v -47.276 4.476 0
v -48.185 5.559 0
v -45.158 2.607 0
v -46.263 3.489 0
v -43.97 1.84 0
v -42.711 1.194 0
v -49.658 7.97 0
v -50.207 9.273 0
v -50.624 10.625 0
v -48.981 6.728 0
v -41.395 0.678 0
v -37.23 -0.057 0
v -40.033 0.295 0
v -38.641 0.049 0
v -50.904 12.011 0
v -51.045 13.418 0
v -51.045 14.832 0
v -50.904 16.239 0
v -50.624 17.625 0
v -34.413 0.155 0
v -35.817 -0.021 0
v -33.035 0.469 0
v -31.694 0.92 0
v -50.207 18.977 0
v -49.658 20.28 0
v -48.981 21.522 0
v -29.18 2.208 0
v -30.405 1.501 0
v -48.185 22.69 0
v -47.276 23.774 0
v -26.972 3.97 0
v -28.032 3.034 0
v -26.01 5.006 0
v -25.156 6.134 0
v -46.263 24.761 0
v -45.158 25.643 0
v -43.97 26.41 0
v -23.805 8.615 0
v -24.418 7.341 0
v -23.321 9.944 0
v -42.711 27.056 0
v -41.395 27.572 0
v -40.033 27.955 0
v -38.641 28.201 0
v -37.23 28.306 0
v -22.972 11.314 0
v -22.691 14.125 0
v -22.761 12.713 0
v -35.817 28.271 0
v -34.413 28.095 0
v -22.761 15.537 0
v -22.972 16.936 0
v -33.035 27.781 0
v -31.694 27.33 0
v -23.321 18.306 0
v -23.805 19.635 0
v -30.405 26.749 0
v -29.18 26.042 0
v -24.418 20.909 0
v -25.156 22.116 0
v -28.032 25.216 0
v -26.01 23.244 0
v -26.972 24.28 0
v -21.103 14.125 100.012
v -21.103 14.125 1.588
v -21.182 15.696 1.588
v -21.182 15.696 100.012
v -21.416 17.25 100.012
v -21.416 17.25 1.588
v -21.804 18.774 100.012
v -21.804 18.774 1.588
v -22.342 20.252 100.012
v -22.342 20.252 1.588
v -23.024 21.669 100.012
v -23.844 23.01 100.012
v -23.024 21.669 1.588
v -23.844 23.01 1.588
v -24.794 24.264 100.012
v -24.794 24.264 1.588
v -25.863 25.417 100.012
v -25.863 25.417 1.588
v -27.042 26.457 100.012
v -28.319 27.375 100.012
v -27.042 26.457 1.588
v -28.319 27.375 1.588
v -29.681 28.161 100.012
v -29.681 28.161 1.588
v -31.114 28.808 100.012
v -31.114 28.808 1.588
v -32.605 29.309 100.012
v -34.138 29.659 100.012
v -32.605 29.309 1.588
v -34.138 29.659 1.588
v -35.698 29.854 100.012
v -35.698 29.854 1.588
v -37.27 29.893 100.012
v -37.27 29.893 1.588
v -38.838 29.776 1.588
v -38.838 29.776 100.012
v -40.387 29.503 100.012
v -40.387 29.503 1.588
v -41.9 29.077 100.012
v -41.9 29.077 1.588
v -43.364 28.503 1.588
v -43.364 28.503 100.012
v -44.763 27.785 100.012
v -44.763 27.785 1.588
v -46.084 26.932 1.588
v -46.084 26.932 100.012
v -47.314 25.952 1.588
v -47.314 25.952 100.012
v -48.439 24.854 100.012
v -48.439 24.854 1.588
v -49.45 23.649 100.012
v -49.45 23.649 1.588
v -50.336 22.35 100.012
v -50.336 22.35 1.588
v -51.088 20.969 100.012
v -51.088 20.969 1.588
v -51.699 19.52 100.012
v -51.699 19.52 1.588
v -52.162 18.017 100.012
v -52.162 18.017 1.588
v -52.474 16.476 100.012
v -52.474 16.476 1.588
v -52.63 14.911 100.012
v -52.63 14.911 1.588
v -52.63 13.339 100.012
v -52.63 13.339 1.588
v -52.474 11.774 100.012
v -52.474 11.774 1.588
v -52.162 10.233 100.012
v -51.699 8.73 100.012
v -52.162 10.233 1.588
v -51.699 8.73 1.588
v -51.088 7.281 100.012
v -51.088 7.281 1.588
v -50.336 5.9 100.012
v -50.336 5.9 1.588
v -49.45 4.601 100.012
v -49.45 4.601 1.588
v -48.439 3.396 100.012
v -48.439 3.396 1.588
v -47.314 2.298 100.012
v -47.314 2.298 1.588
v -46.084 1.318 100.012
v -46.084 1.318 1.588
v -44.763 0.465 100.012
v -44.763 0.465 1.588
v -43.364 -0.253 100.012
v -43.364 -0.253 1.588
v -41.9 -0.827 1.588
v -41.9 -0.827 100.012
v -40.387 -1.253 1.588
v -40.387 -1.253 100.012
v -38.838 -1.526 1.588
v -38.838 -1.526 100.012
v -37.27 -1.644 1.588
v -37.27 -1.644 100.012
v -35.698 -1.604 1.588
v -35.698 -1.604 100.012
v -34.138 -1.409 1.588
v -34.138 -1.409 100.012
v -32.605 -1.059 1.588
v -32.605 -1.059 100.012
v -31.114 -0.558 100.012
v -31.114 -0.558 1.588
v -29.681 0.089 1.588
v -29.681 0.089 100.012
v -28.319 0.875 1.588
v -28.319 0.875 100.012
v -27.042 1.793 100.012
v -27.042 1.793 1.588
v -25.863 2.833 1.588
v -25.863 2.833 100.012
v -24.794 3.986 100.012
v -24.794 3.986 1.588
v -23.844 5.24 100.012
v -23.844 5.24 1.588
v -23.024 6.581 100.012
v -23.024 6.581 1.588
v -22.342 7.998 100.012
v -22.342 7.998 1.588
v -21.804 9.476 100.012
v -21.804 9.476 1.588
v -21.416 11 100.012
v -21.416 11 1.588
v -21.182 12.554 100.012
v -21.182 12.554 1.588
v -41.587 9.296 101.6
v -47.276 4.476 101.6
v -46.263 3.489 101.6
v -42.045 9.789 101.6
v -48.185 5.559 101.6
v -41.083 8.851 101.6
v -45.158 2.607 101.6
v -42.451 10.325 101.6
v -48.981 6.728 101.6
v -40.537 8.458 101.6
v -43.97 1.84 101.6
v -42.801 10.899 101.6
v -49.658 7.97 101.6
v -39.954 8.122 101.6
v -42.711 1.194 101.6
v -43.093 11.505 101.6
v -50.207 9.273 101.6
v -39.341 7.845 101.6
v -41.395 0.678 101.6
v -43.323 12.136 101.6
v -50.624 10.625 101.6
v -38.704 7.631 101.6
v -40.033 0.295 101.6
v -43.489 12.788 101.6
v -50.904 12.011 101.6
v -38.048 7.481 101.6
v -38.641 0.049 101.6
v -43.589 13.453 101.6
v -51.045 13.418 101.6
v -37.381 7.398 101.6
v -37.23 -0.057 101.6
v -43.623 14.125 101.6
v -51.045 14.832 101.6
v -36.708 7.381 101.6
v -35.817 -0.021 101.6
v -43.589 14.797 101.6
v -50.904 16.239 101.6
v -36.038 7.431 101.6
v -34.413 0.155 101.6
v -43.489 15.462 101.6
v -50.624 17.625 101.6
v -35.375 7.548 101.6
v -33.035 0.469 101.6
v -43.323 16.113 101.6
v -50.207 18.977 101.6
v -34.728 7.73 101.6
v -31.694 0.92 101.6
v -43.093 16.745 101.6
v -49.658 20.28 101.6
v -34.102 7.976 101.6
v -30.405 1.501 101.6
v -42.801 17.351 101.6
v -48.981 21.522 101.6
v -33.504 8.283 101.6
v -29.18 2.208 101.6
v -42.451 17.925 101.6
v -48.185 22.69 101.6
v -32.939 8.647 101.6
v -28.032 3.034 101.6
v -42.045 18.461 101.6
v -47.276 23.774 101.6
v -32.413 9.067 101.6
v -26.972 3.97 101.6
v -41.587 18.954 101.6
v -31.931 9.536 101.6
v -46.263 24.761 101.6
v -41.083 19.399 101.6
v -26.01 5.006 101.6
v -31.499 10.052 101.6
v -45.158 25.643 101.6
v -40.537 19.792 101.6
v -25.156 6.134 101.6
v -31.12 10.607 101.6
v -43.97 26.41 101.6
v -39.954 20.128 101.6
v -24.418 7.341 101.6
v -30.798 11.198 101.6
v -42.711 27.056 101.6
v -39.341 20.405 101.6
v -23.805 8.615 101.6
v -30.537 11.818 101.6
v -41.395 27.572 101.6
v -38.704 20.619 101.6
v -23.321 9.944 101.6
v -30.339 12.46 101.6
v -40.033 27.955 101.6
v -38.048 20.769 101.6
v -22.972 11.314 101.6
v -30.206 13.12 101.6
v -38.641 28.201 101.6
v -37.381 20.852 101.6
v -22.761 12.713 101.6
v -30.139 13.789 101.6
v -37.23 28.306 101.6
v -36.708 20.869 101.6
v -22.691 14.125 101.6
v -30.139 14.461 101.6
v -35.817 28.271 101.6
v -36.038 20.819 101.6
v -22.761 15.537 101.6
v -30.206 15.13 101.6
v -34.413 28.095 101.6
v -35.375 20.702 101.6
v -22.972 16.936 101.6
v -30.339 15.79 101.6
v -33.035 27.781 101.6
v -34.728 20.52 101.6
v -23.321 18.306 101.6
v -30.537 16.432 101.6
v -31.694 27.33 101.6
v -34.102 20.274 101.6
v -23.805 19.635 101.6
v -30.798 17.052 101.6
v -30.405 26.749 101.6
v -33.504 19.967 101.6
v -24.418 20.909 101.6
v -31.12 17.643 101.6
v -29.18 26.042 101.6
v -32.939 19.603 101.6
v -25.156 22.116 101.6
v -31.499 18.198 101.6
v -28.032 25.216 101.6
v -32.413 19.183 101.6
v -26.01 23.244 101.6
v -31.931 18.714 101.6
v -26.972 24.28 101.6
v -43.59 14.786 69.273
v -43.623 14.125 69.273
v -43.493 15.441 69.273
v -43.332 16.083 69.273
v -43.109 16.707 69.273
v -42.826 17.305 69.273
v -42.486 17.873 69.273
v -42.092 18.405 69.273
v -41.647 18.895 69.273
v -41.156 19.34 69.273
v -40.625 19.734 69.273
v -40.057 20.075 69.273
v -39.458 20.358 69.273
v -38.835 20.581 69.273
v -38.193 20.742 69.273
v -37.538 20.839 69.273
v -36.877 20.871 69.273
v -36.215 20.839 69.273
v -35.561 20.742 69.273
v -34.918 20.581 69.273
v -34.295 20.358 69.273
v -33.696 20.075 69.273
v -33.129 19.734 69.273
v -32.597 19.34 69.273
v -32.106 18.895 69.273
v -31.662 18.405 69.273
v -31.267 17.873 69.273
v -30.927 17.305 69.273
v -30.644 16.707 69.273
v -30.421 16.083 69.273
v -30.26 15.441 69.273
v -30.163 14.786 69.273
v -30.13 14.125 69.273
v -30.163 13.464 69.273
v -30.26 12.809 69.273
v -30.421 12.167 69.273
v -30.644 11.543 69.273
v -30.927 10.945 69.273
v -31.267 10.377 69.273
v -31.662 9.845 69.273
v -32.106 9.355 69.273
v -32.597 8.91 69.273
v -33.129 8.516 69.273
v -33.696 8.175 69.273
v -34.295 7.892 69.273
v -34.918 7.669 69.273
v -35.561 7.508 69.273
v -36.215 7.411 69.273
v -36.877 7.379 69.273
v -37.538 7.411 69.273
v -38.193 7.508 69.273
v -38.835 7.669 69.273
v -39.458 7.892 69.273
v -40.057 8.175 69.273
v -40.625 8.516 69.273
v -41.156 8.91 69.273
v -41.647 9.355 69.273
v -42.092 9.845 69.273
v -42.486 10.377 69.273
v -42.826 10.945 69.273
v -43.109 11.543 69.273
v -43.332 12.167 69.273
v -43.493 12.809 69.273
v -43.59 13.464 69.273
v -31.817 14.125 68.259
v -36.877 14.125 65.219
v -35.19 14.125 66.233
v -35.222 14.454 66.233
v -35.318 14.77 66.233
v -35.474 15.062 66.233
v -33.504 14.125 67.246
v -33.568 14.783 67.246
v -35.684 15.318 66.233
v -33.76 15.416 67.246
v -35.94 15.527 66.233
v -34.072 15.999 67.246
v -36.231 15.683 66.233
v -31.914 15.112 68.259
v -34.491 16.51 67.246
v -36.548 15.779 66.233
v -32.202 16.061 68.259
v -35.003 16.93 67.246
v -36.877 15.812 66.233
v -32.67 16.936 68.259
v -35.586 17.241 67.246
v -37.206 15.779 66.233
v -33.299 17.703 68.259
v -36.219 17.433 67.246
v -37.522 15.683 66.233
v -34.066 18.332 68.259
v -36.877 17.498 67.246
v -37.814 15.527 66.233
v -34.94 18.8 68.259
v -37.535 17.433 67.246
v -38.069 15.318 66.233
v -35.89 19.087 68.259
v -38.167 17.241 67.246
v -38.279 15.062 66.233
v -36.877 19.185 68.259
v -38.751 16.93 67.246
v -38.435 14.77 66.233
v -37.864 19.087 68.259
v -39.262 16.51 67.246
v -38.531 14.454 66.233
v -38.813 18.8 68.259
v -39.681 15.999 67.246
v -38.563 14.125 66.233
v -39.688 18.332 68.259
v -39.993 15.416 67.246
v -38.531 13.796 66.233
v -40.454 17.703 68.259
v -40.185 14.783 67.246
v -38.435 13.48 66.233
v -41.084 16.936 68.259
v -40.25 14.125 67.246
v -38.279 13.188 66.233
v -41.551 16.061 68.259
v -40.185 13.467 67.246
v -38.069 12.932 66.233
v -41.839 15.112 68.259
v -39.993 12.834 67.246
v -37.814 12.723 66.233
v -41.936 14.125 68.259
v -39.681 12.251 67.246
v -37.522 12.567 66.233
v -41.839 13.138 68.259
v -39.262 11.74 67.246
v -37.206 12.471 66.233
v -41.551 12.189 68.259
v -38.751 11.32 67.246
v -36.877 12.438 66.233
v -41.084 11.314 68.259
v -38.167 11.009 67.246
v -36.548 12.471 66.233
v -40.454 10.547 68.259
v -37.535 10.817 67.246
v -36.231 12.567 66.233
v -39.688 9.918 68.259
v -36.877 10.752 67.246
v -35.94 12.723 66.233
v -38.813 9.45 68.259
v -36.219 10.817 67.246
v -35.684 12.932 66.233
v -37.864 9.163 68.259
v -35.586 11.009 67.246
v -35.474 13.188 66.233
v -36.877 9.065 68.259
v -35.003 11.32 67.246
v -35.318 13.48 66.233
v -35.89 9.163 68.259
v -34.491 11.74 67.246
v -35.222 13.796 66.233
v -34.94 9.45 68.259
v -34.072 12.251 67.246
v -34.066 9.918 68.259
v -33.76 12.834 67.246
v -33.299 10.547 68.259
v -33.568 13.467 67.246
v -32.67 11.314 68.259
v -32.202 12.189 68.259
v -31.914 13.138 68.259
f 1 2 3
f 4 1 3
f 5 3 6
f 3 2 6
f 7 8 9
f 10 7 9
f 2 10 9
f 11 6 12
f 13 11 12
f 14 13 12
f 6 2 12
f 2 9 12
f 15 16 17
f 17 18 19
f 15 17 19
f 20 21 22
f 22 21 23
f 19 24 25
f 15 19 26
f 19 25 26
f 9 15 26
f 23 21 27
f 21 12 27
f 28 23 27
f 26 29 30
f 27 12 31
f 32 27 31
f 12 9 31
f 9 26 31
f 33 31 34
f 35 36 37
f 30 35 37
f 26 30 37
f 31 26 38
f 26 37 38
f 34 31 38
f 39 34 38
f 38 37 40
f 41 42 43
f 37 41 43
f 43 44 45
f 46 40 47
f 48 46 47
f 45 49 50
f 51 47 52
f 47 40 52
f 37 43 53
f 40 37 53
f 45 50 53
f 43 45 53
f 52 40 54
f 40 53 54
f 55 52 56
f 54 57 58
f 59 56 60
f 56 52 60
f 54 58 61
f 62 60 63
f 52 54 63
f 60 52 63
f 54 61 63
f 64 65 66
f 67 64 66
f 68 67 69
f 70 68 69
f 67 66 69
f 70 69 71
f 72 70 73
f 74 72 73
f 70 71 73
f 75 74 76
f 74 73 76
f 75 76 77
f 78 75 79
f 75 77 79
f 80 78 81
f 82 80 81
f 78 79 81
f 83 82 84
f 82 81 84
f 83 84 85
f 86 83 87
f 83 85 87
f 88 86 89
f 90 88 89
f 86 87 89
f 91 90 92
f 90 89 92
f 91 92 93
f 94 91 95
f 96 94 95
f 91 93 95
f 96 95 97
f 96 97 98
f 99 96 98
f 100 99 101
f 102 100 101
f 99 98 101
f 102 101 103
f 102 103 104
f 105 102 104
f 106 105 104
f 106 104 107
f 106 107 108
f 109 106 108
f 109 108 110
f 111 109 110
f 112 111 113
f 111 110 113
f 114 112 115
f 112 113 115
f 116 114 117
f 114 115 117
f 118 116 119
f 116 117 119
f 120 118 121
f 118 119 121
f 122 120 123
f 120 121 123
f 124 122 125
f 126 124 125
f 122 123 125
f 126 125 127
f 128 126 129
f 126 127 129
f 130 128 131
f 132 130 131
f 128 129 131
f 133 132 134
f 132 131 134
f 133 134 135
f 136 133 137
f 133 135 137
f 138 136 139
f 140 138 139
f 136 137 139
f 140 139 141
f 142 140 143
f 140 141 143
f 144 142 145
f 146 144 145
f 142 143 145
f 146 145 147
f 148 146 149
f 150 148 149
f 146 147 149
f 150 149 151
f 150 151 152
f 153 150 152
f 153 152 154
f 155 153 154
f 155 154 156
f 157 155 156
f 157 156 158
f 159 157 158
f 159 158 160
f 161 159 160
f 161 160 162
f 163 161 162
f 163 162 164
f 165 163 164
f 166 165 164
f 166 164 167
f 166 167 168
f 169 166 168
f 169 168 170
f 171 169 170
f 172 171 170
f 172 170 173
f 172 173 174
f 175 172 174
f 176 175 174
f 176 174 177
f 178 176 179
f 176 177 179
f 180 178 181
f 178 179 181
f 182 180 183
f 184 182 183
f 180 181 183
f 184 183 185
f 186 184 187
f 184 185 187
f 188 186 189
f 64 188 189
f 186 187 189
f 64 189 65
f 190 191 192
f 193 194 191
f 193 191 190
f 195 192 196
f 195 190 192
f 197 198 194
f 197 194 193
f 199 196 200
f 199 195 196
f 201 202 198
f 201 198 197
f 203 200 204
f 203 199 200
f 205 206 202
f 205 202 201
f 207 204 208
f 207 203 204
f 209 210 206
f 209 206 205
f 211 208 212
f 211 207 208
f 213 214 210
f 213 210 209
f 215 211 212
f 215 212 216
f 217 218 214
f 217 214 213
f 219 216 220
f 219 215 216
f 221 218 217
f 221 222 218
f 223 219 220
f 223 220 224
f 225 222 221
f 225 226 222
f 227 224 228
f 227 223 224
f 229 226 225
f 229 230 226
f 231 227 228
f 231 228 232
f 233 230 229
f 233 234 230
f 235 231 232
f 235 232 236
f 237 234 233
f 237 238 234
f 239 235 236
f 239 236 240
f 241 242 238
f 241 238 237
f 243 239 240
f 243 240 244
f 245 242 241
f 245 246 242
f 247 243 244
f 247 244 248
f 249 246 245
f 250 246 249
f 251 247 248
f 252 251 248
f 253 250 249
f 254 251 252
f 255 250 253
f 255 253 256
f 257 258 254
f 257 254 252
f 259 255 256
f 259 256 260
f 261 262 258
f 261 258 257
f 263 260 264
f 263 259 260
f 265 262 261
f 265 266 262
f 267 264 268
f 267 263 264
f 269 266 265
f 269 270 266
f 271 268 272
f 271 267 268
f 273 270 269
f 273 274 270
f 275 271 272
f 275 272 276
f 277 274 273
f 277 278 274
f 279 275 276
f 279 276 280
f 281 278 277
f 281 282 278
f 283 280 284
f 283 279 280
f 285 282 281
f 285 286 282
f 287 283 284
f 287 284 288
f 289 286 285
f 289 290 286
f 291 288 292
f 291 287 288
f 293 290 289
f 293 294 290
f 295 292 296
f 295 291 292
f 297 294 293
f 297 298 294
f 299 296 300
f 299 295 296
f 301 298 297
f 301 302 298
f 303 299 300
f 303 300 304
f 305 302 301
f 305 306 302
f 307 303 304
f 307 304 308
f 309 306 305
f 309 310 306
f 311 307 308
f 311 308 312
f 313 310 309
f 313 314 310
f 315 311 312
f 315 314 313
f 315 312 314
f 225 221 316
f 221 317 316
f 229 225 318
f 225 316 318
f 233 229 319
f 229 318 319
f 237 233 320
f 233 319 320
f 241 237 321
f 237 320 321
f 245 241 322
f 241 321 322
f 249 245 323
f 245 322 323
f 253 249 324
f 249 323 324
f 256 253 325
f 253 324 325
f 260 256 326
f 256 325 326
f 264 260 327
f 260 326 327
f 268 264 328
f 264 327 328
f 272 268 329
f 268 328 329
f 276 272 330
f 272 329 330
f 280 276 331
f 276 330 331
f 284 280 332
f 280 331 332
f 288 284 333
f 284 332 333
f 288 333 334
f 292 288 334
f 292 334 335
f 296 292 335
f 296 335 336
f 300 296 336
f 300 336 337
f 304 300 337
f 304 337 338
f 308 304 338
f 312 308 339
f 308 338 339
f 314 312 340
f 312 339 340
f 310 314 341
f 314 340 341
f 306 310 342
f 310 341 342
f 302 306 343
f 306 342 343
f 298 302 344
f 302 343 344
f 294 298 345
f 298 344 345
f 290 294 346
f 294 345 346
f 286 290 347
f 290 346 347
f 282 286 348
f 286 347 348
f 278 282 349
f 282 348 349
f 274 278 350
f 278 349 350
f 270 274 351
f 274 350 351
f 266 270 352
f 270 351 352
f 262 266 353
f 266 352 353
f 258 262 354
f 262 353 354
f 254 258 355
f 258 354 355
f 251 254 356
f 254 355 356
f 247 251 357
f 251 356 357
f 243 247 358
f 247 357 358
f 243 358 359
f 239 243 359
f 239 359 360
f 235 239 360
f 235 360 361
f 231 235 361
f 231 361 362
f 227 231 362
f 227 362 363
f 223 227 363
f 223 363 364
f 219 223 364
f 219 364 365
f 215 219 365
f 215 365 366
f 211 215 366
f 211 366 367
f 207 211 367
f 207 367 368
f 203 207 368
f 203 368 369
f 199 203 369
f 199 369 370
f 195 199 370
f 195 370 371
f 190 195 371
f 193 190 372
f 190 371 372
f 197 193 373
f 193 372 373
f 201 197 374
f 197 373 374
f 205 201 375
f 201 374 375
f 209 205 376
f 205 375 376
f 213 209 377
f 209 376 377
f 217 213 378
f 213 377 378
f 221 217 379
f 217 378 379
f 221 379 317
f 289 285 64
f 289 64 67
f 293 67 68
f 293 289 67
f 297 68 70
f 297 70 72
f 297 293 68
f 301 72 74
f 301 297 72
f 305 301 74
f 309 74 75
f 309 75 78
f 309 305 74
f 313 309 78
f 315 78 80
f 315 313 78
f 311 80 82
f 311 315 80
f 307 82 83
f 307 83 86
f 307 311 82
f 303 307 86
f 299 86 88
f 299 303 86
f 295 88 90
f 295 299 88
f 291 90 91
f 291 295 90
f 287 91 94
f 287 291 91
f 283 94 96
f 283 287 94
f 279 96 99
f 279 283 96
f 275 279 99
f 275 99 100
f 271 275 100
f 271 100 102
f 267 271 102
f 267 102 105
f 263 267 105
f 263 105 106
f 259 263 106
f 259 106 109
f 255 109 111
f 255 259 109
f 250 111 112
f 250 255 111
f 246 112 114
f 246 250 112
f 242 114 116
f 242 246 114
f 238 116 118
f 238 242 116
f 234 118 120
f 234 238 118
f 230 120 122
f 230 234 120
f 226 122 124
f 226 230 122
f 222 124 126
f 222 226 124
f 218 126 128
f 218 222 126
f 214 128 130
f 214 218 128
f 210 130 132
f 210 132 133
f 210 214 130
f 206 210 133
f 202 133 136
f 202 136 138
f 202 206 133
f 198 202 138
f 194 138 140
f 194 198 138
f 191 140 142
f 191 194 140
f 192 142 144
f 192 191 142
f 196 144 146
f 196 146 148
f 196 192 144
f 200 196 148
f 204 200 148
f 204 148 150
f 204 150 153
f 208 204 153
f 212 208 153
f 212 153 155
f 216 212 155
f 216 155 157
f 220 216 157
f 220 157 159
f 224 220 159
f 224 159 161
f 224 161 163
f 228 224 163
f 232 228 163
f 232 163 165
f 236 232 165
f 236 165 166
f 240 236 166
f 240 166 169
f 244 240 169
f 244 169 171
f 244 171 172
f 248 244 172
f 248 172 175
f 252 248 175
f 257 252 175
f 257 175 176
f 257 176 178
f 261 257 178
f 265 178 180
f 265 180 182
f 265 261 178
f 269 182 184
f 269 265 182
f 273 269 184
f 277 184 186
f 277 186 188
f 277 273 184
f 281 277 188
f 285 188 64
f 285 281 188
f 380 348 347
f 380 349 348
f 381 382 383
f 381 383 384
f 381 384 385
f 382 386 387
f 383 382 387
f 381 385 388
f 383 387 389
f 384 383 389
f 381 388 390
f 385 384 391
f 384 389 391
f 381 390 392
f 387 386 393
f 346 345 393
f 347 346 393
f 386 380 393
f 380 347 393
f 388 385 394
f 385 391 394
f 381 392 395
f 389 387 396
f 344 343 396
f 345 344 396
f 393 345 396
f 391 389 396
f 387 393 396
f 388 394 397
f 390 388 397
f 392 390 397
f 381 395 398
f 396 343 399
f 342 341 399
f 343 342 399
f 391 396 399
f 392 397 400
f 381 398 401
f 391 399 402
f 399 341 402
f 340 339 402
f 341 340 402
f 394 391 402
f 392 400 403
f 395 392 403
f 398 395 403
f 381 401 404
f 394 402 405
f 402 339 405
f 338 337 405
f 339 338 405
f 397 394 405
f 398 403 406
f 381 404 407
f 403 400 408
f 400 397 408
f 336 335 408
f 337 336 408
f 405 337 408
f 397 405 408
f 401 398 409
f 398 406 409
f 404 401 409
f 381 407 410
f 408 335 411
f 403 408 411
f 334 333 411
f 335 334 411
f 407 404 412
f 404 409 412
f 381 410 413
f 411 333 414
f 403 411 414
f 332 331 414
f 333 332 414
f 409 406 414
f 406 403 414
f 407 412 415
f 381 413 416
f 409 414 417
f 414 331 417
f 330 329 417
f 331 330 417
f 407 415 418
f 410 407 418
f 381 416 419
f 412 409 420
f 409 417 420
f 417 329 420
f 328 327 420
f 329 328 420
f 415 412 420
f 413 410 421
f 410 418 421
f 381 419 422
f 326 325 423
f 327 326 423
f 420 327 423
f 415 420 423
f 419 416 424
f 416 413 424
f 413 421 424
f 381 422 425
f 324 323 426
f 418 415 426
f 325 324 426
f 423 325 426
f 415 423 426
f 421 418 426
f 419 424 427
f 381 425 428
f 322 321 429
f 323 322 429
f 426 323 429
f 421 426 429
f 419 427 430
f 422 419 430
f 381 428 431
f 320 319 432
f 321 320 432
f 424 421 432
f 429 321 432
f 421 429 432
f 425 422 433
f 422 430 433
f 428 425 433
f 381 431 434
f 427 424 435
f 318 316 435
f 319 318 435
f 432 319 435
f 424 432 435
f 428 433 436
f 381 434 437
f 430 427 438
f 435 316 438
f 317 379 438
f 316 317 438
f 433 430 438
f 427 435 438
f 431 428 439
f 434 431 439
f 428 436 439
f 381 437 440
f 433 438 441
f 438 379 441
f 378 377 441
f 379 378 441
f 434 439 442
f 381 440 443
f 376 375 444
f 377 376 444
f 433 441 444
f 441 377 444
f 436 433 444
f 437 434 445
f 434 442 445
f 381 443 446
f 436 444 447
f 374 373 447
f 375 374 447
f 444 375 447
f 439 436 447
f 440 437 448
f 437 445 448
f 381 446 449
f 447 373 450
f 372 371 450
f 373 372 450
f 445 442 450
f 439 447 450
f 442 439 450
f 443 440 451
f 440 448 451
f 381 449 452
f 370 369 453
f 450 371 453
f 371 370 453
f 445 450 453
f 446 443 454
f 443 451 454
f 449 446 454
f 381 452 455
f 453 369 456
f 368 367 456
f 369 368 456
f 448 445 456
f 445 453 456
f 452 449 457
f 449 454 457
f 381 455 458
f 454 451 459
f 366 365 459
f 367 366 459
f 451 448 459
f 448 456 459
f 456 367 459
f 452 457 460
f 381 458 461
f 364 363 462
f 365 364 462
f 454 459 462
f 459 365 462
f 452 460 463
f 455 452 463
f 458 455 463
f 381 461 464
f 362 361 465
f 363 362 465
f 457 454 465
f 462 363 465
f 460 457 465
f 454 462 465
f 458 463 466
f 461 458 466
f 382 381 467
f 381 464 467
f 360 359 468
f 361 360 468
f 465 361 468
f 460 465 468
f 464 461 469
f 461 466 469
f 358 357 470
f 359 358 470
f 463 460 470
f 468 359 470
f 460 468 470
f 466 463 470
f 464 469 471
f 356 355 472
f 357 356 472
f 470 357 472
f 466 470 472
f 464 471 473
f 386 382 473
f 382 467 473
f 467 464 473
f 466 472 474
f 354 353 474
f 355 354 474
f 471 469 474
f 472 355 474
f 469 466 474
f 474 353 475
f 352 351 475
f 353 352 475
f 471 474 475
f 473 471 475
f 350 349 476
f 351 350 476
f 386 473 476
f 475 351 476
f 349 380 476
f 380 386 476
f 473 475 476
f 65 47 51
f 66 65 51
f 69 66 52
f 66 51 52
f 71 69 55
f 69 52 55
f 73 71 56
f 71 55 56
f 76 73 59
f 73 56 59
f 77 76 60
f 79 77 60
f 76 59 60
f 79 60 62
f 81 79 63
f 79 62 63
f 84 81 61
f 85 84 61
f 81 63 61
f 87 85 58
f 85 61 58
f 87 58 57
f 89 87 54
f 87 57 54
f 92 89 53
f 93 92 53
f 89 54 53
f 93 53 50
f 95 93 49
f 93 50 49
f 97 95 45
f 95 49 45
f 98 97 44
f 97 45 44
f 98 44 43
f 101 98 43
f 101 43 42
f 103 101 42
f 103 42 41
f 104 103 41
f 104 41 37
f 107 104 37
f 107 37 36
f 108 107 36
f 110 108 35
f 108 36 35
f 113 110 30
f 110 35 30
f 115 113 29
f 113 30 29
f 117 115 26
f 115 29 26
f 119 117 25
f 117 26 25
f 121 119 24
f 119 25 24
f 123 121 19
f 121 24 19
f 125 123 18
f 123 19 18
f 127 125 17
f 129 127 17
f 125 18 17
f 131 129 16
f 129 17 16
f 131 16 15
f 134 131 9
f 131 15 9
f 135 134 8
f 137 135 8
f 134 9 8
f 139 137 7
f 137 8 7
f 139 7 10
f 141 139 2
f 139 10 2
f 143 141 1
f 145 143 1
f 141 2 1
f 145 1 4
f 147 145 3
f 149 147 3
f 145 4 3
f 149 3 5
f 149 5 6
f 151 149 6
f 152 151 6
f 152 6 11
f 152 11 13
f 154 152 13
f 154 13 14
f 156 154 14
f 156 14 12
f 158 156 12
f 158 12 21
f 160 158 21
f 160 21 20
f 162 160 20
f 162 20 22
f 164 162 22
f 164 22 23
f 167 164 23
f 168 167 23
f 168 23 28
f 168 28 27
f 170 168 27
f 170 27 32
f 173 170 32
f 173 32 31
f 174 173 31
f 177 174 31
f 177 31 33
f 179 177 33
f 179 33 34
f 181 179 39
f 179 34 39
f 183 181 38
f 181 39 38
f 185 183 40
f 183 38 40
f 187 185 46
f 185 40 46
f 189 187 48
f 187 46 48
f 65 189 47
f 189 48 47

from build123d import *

# Parameters (mm, degrees)
F0_R     = 15.7734
F1_DEPTH = 101.6
F3_D     = 13.49248
F3_DEPTH = 32.3272658
F3_TIP   = 4.0535499425
F4_SIZE  = 1.5875


with BuildPart() as f1:
    # F0 (on Top) → F1 (new body)
    with BuildSketch(Plane.XY):
        with Locations((-36.8766486645, 14.1249885783)):
            Circle(F0_R)
    extrude(amount=F1_DEPTH)

    # F3
    with Locations(Plane.XY.offset(101.6)):
        with Locations((-36.8766486645, 14.1249885783)):
            Hole(F3_D / 2, depth=F3_DEPTH)
            with Locations((0, 0, -(F3_DEPTH + F3_TIP / 2))):  # 118° drill point
                Cone(0, F3_D / 2, F3_TIP, mode=Mode.SUBTRACT)

    # F4
    f4_edges = [f1.edges().sort_by_distance(p)[0] for p in [
        (-52.650049, 14.124989, 0),
        (-52.650049, 14.124989, 101.6),
    ]]
    chamfer(f4_edges, length=F4_SIZE)


solid = f1.part
